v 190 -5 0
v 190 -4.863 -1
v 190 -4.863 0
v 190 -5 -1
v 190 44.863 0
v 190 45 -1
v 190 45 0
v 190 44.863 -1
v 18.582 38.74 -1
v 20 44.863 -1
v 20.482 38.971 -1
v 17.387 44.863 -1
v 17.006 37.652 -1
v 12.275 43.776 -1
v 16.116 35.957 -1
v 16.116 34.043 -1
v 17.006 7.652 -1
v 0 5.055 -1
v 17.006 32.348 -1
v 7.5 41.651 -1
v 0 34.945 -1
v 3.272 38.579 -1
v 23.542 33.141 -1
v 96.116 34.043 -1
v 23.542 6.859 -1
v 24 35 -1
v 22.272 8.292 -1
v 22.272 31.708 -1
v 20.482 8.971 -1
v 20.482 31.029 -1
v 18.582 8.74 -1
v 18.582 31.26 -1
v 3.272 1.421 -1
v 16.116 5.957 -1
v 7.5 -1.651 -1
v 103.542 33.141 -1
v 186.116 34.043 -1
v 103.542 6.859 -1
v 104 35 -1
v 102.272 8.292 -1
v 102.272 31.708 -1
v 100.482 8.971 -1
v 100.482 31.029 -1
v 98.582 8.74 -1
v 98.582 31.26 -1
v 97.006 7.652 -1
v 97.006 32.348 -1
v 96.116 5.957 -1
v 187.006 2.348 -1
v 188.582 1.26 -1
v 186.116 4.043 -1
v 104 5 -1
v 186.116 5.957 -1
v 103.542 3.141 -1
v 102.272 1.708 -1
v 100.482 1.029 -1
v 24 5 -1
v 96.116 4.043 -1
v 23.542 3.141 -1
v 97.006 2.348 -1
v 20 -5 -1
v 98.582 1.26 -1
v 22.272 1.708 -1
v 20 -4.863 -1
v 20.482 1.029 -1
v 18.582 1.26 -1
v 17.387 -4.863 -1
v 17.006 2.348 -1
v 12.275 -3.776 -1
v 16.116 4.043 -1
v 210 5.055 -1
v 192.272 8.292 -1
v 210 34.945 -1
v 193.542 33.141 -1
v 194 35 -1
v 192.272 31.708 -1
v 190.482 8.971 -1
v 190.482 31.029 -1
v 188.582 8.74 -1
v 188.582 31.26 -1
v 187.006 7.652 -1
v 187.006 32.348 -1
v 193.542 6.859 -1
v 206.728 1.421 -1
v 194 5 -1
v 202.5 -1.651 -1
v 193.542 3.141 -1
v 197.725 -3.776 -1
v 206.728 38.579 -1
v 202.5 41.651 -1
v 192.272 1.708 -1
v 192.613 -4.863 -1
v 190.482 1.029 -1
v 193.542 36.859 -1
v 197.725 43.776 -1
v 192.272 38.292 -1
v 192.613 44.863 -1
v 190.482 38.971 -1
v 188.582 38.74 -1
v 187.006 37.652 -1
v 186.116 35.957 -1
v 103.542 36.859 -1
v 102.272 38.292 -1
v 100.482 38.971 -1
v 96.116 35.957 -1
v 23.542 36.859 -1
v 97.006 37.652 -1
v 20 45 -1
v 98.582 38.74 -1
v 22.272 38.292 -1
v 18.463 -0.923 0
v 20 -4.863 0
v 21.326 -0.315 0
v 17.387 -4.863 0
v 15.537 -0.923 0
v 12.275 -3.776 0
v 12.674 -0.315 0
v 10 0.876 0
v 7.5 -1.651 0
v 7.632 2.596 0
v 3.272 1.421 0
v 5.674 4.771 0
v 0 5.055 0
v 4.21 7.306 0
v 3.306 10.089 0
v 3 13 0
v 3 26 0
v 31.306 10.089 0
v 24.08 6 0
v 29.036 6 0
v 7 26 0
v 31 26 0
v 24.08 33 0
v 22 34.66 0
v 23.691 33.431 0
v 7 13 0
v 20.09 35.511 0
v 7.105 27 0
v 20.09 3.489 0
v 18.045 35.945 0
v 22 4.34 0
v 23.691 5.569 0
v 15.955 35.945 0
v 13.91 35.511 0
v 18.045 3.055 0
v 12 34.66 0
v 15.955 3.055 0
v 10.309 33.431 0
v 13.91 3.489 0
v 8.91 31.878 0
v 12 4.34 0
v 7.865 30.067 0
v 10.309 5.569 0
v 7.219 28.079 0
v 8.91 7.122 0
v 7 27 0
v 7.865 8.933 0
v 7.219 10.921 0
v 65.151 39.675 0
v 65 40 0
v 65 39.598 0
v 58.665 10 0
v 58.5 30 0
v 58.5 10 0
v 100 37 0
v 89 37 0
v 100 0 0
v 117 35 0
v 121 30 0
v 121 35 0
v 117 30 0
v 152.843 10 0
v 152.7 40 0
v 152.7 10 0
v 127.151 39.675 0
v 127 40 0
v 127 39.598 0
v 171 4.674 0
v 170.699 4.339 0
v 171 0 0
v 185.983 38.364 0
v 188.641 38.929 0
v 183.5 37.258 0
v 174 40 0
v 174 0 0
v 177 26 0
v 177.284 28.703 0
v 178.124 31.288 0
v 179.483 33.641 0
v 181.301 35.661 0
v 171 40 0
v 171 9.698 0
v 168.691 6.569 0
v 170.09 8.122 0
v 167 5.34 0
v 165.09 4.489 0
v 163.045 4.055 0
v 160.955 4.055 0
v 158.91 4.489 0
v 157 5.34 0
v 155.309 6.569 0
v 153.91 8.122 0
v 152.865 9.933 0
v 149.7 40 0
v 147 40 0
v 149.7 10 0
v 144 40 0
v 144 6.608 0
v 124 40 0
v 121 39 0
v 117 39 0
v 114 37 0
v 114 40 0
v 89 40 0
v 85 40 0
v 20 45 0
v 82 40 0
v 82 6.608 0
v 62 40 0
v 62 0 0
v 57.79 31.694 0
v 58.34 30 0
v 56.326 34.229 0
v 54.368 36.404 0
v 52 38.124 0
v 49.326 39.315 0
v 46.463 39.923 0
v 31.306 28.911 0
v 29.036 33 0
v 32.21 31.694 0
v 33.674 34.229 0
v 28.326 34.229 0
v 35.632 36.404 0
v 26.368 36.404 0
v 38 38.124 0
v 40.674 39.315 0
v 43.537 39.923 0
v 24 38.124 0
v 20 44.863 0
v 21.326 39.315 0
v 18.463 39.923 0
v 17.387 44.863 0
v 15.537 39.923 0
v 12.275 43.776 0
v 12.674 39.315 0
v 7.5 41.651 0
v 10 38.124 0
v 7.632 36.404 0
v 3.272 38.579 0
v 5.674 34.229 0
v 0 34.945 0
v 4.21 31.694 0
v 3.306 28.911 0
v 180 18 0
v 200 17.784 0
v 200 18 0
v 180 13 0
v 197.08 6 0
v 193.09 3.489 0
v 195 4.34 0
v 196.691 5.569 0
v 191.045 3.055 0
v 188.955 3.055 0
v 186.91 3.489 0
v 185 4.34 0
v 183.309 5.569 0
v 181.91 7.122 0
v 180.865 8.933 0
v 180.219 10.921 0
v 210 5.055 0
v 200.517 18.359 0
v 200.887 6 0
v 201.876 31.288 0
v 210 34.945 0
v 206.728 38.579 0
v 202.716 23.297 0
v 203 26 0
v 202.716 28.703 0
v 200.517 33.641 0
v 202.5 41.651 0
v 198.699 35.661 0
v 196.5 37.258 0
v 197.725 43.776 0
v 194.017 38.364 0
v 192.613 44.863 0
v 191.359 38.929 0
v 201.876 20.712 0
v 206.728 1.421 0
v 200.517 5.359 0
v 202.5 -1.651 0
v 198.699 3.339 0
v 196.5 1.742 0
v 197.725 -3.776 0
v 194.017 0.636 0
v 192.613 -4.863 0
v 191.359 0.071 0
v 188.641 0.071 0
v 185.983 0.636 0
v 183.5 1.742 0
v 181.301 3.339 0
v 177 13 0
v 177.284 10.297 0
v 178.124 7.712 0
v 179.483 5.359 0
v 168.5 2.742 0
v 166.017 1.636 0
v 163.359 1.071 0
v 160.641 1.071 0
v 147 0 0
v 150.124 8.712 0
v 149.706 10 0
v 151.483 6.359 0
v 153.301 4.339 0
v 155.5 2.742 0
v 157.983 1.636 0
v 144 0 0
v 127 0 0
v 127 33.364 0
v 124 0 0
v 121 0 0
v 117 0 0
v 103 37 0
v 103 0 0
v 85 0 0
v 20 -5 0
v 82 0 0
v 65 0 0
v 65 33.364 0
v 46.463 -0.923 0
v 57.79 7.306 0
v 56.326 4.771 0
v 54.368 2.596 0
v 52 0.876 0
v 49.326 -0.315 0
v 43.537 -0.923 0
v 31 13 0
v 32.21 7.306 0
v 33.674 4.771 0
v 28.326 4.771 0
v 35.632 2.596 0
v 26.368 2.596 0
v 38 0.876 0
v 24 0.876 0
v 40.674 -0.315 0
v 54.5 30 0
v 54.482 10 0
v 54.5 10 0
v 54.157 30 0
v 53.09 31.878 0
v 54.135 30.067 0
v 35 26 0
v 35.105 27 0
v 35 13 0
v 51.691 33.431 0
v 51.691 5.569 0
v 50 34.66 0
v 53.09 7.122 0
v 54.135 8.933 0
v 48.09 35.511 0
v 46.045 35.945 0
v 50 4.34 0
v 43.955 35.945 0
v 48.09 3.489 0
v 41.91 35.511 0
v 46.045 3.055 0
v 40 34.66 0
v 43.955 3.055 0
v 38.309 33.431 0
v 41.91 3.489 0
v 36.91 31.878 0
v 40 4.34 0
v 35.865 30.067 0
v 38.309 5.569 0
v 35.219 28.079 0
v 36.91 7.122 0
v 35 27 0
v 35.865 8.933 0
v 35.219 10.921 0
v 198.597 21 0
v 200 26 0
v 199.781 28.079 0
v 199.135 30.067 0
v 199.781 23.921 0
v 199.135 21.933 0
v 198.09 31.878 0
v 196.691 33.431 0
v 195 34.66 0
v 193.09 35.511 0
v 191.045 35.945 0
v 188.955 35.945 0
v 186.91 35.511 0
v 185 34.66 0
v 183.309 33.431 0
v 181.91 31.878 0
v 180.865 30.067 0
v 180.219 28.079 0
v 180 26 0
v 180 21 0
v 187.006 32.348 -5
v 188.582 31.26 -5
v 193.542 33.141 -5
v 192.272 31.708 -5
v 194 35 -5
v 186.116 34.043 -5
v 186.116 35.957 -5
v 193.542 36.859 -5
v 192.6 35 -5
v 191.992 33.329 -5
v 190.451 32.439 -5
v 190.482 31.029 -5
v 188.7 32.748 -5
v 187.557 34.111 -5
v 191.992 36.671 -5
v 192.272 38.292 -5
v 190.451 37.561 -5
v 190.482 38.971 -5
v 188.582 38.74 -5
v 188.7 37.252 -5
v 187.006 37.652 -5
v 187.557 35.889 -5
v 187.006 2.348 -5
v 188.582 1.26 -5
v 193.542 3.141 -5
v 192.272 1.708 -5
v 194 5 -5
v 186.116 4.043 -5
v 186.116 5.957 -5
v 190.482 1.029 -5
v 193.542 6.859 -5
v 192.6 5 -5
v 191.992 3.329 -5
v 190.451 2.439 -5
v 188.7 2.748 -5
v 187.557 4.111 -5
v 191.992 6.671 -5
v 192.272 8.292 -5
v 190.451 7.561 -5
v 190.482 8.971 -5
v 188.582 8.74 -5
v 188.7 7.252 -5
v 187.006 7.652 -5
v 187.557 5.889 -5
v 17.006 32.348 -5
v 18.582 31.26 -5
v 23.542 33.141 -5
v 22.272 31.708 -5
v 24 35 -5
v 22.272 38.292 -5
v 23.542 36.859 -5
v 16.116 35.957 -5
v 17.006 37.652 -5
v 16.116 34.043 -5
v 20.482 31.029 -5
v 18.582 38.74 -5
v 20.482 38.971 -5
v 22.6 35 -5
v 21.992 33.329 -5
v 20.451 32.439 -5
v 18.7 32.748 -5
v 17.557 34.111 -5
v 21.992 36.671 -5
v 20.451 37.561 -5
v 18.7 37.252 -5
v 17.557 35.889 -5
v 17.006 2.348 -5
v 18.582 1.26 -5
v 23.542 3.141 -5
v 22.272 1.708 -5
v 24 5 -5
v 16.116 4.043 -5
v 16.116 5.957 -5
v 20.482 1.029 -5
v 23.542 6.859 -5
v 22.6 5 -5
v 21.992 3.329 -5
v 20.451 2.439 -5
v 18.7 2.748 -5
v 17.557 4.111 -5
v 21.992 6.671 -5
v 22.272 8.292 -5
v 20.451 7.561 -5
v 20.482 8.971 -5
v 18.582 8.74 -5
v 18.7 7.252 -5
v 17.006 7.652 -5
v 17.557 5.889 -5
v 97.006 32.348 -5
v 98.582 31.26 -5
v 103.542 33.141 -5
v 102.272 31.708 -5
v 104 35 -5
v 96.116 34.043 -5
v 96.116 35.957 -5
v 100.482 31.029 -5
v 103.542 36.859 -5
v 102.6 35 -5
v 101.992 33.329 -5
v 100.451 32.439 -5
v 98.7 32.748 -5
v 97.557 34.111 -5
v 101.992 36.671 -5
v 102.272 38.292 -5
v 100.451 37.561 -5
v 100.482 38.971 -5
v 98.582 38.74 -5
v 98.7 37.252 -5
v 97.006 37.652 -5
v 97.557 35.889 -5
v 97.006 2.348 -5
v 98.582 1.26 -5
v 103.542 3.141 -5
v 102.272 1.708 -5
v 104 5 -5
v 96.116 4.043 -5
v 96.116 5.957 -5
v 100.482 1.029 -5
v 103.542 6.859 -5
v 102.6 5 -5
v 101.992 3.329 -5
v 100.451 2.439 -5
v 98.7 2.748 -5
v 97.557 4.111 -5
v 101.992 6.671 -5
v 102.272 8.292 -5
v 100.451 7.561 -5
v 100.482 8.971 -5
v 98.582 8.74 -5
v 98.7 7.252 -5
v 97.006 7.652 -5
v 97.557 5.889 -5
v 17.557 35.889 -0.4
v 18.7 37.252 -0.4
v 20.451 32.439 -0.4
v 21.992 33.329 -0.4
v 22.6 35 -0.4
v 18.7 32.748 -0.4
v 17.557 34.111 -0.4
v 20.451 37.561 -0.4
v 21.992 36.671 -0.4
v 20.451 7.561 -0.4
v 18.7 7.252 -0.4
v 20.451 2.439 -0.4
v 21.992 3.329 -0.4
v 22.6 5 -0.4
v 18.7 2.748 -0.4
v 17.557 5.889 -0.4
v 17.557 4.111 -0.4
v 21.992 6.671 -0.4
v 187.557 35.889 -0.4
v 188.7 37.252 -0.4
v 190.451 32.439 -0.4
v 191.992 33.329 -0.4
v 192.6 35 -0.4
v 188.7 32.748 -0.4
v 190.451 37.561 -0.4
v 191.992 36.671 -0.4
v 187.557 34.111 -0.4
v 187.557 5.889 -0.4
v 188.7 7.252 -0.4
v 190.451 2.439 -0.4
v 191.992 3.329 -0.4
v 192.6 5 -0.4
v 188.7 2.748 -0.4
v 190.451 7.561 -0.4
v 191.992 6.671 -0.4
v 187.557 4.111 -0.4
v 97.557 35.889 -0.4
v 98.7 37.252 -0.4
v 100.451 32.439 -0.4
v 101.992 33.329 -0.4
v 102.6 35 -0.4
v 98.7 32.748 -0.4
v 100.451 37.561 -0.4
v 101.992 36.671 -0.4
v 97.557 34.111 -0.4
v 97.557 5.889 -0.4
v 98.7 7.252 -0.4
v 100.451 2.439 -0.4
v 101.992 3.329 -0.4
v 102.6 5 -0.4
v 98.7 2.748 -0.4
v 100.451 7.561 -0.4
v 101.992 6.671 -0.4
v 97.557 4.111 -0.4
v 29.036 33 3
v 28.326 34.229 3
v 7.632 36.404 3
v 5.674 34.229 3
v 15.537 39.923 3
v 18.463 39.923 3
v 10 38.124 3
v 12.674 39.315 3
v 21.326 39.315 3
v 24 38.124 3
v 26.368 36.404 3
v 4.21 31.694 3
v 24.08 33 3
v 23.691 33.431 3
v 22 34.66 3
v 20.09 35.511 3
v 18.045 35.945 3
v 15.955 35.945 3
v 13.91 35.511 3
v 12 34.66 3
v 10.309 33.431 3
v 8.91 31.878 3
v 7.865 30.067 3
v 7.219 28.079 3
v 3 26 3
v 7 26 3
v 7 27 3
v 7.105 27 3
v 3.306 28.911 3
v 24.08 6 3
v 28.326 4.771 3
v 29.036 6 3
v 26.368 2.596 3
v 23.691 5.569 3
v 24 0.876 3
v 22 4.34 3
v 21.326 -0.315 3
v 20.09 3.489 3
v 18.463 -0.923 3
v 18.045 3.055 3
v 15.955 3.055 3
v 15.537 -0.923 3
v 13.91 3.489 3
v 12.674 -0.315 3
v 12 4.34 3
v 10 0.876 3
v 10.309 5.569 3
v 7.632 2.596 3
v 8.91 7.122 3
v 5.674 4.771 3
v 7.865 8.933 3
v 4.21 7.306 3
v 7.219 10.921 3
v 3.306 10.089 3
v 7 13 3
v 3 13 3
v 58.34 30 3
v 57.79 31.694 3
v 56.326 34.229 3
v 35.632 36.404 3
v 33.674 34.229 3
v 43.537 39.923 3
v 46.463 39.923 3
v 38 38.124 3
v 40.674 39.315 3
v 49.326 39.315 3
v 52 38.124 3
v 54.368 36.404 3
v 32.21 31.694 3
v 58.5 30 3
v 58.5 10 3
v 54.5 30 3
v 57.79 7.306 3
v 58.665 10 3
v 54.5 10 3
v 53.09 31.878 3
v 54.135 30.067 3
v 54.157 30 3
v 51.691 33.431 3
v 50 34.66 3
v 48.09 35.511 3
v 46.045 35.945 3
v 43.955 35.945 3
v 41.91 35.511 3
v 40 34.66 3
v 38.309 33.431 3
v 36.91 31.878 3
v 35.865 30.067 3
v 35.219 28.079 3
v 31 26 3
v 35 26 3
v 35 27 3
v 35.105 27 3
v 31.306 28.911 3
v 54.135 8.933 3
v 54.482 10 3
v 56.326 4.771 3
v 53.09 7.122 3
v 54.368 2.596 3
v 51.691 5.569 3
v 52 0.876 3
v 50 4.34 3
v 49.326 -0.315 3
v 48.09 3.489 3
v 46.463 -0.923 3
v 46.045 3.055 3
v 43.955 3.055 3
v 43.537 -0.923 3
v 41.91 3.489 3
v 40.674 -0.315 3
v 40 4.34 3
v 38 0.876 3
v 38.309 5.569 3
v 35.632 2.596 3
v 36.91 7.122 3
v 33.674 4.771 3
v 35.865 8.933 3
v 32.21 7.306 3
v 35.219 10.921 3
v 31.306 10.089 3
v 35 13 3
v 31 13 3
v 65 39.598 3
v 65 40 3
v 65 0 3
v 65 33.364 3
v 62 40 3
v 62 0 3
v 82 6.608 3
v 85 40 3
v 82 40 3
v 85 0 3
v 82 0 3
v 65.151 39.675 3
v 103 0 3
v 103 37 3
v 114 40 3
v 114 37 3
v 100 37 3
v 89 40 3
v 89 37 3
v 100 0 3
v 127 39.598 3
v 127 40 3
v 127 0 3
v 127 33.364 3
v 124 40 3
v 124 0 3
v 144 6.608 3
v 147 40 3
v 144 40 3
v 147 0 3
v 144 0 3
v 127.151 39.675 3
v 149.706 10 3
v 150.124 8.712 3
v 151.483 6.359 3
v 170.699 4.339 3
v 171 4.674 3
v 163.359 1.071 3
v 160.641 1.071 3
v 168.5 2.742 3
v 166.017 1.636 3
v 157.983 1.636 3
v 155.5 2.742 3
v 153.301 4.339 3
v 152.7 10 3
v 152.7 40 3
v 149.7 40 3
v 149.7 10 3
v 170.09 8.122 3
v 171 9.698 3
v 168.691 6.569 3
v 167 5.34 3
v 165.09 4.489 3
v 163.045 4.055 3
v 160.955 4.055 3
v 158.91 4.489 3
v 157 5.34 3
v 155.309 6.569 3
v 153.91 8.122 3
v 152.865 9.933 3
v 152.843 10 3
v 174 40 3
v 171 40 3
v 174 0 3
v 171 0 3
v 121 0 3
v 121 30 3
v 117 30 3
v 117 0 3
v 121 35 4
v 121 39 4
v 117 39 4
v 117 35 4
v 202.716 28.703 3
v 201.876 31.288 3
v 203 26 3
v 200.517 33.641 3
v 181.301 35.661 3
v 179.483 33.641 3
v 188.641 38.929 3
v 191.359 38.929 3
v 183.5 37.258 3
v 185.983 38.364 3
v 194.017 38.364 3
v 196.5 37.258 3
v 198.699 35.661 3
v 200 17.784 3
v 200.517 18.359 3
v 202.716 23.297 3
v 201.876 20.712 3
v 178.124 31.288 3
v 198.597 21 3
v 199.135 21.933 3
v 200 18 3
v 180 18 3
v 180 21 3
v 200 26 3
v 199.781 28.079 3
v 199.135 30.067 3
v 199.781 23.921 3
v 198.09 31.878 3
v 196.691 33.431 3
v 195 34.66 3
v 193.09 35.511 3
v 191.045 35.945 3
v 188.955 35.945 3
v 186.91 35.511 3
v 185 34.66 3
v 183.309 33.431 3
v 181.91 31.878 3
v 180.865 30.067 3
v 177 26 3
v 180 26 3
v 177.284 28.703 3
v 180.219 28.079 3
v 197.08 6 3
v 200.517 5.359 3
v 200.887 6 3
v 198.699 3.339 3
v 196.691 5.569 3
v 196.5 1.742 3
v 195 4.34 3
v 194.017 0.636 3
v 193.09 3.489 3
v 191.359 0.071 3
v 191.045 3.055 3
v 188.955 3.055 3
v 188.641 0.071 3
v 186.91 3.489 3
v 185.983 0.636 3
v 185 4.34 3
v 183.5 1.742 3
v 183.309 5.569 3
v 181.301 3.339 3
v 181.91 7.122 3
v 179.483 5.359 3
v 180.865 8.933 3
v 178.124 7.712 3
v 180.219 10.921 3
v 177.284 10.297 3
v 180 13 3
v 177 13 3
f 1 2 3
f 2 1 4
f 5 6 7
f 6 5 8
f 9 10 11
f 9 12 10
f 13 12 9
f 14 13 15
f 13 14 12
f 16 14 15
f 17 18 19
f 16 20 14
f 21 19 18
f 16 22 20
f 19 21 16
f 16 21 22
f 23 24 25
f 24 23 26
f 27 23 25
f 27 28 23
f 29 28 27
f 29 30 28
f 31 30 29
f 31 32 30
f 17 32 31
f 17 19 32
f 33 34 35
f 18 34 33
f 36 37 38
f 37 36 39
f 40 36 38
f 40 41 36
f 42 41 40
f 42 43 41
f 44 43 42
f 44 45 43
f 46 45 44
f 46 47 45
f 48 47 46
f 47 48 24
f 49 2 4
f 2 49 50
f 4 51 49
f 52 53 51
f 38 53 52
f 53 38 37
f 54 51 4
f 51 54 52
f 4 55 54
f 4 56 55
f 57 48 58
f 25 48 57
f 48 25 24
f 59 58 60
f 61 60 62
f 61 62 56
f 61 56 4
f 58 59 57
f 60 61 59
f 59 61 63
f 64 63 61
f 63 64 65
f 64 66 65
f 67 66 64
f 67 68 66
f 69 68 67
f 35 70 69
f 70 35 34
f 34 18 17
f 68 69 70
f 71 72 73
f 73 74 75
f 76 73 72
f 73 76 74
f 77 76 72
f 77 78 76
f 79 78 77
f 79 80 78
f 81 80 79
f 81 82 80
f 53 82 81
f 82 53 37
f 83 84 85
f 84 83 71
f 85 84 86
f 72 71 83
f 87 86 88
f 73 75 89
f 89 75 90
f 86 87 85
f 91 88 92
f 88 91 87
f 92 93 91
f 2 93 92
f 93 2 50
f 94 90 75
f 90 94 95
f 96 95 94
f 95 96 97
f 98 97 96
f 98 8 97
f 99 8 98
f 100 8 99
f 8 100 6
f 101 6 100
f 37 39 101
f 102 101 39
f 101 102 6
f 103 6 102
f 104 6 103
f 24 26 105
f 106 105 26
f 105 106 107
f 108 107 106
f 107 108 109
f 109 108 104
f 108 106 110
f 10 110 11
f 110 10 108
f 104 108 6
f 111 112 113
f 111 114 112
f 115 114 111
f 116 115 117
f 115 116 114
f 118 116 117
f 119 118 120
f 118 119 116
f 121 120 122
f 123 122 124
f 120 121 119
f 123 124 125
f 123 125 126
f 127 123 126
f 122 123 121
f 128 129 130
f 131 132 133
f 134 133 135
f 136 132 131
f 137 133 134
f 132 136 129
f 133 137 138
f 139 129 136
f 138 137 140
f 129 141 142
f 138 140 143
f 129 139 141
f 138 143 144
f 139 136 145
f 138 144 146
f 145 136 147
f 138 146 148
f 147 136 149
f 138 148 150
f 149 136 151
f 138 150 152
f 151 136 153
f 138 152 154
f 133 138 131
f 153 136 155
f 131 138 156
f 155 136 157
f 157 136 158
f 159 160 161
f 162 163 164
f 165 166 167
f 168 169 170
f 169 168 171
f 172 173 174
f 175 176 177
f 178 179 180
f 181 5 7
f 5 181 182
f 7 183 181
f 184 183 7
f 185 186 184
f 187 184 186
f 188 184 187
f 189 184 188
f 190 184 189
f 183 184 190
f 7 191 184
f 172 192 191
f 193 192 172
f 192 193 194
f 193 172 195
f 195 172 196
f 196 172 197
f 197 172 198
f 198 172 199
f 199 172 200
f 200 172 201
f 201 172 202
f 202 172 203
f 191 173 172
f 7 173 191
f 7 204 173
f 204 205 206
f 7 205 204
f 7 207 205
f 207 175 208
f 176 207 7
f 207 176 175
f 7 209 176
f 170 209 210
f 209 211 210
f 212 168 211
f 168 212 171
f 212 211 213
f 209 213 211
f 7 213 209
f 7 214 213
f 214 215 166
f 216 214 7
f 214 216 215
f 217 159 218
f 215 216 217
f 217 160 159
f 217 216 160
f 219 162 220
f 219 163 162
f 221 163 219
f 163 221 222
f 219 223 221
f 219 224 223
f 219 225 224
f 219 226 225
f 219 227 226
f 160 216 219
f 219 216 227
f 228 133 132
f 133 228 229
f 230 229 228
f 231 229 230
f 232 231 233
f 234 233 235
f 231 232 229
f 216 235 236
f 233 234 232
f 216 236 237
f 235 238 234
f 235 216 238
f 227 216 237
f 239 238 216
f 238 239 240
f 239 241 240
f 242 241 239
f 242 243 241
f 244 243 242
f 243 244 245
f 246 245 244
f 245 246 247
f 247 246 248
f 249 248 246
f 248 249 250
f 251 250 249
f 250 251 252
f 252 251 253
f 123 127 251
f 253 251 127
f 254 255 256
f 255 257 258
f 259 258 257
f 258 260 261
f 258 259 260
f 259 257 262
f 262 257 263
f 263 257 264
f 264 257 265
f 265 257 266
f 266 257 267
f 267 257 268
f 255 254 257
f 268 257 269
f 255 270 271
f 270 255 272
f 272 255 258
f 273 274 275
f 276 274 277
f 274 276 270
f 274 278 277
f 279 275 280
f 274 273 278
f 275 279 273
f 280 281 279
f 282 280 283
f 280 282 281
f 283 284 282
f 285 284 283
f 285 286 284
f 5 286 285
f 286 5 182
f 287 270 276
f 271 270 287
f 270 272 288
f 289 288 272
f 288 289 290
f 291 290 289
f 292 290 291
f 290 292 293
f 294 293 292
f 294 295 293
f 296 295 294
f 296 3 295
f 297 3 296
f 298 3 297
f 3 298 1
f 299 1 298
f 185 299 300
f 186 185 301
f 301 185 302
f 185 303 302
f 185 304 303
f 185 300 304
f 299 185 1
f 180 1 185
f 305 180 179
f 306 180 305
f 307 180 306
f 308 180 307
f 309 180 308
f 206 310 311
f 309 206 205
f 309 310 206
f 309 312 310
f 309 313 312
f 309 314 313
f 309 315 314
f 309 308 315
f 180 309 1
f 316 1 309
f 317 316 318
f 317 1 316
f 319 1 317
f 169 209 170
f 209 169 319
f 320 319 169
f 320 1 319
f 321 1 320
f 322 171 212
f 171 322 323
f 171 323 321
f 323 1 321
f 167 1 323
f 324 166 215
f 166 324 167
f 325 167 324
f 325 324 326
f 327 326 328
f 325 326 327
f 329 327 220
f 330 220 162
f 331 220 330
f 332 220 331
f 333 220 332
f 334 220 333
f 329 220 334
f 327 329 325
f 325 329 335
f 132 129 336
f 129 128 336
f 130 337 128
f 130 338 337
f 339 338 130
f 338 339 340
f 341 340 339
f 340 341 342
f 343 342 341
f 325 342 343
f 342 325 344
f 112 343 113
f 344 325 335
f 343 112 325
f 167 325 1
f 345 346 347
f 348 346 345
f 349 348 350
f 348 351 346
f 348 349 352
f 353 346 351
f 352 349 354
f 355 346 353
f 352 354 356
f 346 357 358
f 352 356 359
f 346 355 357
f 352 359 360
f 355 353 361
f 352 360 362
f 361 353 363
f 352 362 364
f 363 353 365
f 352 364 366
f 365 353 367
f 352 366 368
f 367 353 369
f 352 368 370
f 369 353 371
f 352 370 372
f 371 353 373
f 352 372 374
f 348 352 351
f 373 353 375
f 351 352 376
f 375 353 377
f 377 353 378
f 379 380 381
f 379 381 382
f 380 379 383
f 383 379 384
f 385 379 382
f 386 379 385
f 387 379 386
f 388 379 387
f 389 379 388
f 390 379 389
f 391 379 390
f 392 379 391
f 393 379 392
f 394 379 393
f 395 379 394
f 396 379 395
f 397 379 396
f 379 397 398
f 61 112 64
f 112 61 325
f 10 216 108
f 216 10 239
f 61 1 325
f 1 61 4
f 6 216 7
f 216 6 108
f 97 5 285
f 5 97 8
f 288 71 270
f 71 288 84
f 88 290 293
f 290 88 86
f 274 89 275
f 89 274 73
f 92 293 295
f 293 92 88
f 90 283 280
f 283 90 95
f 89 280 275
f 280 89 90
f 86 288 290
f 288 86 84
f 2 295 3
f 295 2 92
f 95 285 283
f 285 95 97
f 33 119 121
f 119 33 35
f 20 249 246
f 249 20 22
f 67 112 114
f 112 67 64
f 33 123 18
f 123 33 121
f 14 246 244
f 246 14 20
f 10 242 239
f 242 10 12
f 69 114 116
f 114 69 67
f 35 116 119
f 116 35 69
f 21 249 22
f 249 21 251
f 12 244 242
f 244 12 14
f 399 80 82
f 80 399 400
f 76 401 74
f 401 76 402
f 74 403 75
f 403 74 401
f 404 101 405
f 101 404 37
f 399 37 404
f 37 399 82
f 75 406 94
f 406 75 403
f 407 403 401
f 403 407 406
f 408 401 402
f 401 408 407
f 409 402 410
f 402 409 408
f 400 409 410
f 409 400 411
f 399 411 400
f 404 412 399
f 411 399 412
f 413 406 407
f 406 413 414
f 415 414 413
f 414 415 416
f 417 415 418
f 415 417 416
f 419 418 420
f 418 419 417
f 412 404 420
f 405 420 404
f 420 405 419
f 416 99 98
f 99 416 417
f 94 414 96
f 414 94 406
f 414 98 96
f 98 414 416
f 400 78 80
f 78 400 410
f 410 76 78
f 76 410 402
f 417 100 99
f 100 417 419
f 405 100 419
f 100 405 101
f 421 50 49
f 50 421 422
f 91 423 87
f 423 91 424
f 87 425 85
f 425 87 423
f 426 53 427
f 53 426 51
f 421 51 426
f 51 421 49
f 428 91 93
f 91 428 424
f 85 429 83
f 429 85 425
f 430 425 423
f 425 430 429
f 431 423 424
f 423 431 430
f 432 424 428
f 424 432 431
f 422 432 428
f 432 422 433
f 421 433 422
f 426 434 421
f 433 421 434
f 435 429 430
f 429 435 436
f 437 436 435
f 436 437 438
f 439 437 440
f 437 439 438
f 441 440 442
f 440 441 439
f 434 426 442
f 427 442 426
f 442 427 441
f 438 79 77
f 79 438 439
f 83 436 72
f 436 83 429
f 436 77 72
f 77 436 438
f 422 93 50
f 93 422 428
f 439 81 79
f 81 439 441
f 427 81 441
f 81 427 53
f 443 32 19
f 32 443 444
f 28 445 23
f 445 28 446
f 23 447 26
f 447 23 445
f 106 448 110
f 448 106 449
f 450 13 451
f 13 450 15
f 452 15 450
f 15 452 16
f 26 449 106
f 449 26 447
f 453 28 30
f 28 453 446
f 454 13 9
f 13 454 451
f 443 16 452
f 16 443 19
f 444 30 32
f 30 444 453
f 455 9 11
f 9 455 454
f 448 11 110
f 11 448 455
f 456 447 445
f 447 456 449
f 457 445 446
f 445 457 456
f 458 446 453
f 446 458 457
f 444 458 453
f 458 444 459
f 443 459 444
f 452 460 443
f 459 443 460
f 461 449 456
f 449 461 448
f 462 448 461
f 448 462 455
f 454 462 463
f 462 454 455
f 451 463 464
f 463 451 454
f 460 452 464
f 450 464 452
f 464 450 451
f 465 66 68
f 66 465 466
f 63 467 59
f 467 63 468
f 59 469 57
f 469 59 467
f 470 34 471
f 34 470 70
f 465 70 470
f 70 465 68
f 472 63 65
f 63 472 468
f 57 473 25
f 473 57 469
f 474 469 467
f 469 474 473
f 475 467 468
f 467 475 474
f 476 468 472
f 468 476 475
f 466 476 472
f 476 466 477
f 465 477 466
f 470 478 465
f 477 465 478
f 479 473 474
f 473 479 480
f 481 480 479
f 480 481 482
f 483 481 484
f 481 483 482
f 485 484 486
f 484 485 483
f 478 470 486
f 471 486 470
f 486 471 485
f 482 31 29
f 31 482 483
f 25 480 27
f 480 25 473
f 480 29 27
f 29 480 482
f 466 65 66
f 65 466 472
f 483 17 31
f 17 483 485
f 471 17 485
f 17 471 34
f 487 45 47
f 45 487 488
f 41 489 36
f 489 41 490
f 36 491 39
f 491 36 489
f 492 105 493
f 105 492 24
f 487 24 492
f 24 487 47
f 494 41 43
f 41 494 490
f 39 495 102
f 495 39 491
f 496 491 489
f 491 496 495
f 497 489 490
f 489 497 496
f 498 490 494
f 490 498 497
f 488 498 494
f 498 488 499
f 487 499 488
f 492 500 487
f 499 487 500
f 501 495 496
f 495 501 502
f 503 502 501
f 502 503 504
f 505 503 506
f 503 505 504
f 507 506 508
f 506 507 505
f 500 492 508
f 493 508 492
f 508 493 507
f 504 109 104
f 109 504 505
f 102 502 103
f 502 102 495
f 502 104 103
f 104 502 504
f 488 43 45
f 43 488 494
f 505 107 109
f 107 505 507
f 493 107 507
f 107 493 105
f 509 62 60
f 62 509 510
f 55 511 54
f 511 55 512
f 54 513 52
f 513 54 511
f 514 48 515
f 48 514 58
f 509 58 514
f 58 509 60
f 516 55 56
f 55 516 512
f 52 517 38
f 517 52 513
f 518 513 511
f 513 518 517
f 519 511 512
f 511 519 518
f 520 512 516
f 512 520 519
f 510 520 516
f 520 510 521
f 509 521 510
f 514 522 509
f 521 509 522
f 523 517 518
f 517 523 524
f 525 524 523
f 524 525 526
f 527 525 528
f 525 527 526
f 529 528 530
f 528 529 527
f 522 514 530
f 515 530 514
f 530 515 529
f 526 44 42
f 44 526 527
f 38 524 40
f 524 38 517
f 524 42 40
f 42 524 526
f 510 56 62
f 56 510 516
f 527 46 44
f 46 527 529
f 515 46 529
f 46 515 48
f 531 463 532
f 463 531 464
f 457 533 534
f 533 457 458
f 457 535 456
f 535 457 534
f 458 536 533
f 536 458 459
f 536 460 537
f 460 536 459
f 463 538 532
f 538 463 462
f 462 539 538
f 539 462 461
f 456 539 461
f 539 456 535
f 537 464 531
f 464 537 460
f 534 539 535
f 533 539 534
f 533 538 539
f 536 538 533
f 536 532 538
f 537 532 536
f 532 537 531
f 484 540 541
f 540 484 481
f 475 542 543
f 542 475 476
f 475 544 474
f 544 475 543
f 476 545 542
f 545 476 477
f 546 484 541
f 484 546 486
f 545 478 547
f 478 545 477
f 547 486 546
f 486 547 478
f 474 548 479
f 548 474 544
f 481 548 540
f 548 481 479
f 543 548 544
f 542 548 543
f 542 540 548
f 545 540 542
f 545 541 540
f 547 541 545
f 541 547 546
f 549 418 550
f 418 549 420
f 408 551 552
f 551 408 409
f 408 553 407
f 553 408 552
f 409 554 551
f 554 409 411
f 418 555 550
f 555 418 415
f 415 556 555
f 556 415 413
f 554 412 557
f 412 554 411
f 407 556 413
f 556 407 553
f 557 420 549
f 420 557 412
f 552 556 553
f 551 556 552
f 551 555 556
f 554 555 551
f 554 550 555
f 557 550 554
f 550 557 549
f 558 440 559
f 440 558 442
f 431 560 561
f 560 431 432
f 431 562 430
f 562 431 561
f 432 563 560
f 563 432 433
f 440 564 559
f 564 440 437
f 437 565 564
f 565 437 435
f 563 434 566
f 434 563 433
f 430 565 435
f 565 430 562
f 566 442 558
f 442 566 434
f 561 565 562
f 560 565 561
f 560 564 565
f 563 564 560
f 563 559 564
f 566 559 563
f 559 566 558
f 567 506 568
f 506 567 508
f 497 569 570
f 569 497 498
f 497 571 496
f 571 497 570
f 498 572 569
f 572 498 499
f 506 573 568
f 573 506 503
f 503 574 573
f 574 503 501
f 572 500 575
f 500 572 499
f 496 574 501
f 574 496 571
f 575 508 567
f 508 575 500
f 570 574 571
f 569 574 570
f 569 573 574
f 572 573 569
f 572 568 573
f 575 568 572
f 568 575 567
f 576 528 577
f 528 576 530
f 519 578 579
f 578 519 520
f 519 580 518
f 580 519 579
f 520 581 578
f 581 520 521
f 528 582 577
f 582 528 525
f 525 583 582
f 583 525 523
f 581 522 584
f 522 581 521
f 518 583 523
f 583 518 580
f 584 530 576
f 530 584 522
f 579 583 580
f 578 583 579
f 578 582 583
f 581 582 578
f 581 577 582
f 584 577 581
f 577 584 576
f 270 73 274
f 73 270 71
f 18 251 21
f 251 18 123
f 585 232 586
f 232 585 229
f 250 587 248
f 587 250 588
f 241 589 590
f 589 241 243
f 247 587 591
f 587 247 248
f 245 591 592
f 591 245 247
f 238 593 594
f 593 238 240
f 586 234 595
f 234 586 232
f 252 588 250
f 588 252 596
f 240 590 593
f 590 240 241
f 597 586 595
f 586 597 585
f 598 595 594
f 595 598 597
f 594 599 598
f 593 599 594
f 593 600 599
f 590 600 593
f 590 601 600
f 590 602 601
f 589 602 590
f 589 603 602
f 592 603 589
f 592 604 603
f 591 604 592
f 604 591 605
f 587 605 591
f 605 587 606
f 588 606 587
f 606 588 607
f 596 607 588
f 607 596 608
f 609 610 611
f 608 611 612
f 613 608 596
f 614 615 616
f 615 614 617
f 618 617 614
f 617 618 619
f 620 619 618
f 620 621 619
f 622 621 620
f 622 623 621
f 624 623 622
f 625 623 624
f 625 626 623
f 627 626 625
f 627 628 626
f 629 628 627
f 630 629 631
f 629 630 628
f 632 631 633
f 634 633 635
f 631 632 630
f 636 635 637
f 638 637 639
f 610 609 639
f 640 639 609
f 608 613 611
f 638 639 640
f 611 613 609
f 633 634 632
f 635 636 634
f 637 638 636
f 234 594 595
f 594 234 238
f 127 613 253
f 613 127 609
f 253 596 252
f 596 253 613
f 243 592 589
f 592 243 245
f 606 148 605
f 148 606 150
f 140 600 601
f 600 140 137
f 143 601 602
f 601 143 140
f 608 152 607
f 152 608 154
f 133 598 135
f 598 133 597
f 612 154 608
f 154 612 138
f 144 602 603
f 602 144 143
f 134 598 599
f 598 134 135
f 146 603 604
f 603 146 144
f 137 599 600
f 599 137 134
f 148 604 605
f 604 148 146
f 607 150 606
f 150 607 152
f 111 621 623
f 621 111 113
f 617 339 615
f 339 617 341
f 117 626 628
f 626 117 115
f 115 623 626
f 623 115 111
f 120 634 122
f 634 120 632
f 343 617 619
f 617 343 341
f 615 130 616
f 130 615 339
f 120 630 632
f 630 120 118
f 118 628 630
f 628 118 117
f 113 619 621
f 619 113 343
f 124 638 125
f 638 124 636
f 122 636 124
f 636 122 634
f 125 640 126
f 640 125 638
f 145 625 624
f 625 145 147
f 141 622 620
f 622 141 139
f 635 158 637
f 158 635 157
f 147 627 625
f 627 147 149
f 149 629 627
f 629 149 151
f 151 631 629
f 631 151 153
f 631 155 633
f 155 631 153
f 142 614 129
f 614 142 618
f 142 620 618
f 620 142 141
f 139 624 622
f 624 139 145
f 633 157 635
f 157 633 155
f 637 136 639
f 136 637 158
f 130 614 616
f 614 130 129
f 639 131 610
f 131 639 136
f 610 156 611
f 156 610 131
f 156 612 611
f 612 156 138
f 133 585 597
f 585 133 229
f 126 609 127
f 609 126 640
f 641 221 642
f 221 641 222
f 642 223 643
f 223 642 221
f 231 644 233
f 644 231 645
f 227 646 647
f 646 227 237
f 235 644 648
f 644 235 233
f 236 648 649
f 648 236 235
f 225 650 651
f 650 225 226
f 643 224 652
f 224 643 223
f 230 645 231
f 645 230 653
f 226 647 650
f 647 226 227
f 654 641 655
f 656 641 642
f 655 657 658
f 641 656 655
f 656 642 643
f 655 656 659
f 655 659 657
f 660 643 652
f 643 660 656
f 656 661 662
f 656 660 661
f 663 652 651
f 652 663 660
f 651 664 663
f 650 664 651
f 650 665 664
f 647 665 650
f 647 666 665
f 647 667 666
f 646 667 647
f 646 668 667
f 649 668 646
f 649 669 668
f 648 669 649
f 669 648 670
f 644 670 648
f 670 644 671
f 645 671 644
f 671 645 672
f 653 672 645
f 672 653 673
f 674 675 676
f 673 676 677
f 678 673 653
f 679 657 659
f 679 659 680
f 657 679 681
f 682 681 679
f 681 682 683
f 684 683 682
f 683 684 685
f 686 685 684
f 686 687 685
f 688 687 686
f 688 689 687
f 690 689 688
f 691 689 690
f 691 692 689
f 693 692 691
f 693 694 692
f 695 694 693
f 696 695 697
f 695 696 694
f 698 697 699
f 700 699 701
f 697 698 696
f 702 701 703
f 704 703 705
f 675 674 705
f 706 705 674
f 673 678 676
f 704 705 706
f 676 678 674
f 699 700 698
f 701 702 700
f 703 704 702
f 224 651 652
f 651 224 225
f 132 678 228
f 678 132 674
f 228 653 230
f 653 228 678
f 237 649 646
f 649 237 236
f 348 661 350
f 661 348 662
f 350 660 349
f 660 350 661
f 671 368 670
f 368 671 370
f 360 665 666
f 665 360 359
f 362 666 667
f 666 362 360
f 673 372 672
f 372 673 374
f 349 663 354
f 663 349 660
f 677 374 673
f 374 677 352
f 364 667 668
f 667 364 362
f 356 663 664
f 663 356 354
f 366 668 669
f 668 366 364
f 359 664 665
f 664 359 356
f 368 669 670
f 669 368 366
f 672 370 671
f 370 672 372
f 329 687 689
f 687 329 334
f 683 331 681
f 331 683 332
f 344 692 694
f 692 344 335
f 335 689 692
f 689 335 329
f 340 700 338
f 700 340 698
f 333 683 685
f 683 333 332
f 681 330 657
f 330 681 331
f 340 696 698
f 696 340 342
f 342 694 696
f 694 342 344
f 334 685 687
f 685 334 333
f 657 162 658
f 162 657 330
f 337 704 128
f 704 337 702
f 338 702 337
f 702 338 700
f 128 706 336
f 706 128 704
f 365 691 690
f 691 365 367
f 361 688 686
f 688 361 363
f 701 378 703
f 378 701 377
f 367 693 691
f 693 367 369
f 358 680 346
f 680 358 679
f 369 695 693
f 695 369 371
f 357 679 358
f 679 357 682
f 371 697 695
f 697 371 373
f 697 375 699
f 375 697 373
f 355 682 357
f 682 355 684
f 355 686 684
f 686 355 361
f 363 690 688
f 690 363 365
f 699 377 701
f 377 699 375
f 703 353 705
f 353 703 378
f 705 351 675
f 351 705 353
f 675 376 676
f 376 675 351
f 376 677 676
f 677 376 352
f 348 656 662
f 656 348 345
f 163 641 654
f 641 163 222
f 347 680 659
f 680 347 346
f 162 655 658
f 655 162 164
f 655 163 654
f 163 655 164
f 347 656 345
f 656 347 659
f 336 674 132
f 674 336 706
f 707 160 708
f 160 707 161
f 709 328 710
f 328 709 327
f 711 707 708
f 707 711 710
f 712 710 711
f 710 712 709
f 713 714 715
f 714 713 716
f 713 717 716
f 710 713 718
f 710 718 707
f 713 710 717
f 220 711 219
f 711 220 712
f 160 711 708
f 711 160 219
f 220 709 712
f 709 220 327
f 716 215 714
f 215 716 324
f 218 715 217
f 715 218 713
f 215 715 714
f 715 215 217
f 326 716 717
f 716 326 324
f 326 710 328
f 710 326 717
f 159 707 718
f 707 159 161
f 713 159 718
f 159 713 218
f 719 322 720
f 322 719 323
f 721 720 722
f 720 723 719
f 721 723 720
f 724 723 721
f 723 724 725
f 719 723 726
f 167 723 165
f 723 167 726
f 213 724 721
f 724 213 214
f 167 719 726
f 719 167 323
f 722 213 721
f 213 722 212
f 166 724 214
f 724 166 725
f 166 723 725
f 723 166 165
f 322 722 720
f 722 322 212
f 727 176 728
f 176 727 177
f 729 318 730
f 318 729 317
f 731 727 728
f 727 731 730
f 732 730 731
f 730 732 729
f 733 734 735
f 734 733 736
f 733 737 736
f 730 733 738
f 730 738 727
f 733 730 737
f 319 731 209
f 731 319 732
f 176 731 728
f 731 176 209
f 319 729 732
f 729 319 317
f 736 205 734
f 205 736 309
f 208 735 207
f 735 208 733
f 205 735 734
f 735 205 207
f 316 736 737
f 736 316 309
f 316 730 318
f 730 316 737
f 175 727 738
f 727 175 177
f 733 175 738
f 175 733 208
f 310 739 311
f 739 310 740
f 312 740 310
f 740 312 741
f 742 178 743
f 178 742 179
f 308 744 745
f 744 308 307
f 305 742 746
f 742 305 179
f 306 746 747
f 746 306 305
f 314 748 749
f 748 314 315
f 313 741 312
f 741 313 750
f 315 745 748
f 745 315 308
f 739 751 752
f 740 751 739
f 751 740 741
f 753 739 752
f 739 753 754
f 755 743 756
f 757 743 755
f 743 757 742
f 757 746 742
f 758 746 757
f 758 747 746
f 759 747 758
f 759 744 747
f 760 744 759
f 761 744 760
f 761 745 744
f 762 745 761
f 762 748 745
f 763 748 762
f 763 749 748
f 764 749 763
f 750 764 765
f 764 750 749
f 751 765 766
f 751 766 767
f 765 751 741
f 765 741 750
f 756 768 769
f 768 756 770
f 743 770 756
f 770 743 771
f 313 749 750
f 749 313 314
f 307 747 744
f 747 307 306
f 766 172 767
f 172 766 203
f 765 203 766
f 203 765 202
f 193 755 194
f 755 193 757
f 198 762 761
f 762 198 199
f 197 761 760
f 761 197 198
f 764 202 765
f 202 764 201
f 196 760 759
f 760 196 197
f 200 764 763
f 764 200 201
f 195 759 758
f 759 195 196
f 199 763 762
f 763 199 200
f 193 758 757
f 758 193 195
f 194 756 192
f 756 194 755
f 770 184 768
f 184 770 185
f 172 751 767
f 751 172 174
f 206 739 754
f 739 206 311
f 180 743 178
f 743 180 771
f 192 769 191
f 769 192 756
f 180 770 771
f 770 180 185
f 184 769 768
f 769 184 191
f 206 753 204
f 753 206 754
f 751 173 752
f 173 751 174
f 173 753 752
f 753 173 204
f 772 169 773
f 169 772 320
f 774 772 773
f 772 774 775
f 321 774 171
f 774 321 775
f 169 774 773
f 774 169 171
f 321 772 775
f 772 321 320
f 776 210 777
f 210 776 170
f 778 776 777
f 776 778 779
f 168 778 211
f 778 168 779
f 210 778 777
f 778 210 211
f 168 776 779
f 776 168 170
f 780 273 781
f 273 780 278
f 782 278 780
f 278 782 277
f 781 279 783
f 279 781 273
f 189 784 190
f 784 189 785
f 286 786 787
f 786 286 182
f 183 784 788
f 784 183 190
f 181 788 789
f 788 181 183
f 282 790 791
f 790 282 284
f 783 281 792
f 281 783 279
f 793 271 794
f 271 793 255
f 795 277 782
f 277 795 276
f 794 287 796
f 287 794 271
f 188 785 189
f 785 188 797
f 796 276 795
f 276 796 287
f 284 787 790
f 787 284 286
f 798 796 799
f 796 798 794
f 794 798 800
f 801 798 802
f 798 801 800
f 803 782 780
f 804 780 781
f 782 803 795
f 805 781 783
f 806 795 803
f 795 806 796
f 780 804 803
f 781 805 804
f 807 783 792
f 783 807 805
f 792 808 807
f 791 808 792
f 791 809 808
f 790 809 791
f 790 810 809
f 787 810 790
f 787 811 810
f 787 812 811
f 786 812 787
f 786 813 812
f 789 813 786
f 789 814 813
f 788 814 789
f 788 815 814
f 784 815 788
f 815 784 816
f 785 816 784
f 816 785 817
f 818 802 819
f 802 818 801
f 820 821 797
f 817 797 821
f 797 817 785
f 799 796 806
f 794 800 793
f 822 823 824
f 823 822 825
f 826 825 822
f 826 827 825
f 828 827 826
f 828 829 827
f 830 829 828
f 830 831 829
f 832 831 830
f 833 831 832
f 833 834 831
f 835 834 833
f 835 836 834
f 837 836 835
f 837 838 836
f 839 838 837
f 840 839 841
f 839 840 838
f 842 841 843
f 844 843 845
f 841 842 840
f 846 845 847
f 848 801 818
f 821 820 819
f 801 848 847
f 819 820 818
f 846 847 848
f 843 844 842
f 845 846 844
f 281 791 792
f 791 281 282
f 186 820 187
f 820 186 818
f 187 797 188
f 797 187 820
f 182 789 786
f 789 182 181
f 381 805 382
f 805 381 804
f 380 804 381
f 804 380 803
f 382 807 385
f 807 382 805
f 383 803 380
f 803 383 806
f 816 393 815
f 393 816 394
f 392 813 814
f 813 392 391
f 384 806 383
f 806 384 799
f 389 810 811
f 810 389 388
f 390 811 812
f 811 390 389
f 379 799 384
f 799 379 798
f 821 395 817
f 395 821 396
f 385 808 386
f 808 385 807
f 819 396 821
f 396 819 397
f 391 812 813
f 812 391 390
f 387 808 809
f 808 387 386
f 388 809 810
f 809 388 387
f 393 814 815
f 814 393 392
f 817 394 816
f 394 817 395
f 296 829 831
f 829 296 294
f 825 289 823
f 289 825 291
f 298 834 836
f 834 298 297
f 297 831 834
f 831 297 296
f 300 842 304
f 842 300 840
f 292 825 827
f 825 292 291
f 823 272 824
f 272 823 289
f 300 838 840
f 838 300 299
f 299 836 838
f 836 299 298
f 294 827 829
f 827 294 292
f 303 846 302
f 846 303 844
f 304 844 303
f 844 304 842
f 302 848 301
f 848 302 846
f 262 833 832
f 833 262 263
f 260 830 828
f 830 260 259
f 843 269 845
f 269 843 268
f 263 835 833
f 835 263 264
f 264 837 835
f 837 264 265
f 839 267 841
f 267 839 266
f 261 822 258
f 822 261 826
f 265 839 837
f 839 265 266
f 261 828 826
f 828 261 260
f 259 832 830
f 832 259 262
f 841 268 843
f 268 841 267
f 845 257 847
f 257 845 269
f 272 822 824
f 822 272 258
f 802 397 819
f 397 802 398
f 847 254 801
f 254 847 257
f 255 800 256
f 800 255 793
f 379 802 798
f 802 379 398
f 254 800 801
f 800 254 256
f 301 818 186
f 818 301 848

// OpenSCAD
//основа						
union(){
rotate([180,0,0]) translate([20,-45,0])
difference(){  
 union(){  

  cube([170,50,1]);
   translate([170,25,0]) cylinder(1,25,25);
    translate([0,25,0]) cylinder(1,25,25);
  
  translate([170,10,0]) cylinder(5,4,4);
  translate([170,40,0]) cylinder(5,4,4);
  translate([0,10,0]) cylinder(5,4,4);
  translate([0,40,0]) cylinder(5,4,4);
  translate([80,10,0]) cylinder(5,4,4);
  translate([80,40,0]) cylinder(5,4,4);
}
  

  #translate([0,10,0.4]) cylinder(5,2.6,2.6);
  #translate([0,40,0.4]) cylinder(5,2.6,2.6);
  #translate([170,10,0.4]) cylinder(5,2.6,2.6);
  #translate([170,40,0.4]) cylinder(5,2.6,2.6);
  #translate([80,10,0.4]) cylinder(5,2.6,2.6);
  #translate([80,40,0.4]) cylinder(5,2.6,2.6);
  translate([190,0,-2]) cube([5,50,9]);
  translate([-25,0,-2]) cube([5,50,9]);
  
}
translate([20,0,0])
union(){
 union(){
// буква с
  translate([-43,0,0])
 union(){

translate([26,13,0]) cube([4,13,3]);
difference(){
union(){
	
  difference(){
  translate([40,26,0]) cylinder(3,14,14);
  translate([40,26,-1]) cylinder(5,10,10);
  translate([33,12,-1]) cube([20,20,5]);

}

difference(){
  translate([40,13,0]) cylinder(3,14,14);
  translate([40,13,-1]) cylinder(5,10,10);
  translate([32,15,-1]) cube([19,13,5]);
  translate([40,6,-1]) cube(20);
}
}
  translate([30,13,-1]) cube([5,14,5]);
  translate([42,13,-1]) cube(20);
}
}

// буква О

 translate([-15,0,0])
union(){
  translate([49.5,10,0]) cube([4,20,3]);
  translate([26,13,0]) cube([4,13,3]);
difference(){
union(){
	
  difference(){
  translate([40,26,0]) cylinder(3,14,14);
  translate([40,26,-1]) cylinder(5,10,10);
  translate([33,10,-1]) cube([20,10,5]);

}

difference(){
  translate([40,13,0]) cylinder(3,14,14);
  translate([40,13,-1]) cylinder(5,10,10);
  translate([32,17,-1]) cube([19,10,5]);
  translate([40,17,-1]) cube(20);
}
}
  translate([30,13,-1]) cube([5,14,5]);
  translate([42,10,-1]) cube(20);
}
}
}

// буква n
translate([42,0,0])
union(){
 cube([3,40,3]);
 translate([20,0,0,]) cube([3,40,3]);
 translate([20,0,0]) rotate([0,0,27]) cube([3,43,3]);
}

translate([10,0,0])
union(){
//T
translate([70,0,0])
union(){ 
cube([3,40,3]);
 translate([-11,37,0]) cube([25,3,3]);
}

//буква i
  translate([87,0,0]) cube([4,30,3]);
  translate([87,35,0]) cube(4);

//N
translate([94,0,0])
union(){
 cube([3,40,3]);
 translate([20,0,0,]) cube([3,40,3]);
 translate([20,0,0]) rotate([0,0,27]) cube([3,43,3]);
}

//буква u
 translate([144,40,0]) rotate([180,180,0])  
union(){
cube([3,40,3]);
difference(){  
  translate([12,26,0]) cylinder(3,13,13);
  translate([12,26,-1]) cylinder(5,10,10);
  translate([0,10,-1]) cube([30,20,5]);
  translate([-3,0,-1]) cube([3,40,5]);

}
  translate([21.3,0,0]) cube([3,30,3]);
}
}

//буква e
translate([130,0,0])
union(){
translate([28,18,0]) cube([22,3,3]);
translate([27,13,0]) cube([3,13,3]);
difference(){
union(){
	
  difference(){
  translate([40,26,0]) cylinder(3,13,13);
  translate([40,26,-1]) cylinder(5,10,10);
  translate([32,12,-1]) cube([16,10,5]);

}

difference(){
  translate([40,13,0]) cylinder(3,13,13);
  translate([40,13,-1]) cylinder(5,10,10);
  translate([32,15,-1]) cube([19,13,5]);
  translate([40,6,-1]) cube(20);
}
}
translate([30,13,-1]) cube([3,13,5]);
translate([40,10,-1]) cube(10);
}
}
}
}
